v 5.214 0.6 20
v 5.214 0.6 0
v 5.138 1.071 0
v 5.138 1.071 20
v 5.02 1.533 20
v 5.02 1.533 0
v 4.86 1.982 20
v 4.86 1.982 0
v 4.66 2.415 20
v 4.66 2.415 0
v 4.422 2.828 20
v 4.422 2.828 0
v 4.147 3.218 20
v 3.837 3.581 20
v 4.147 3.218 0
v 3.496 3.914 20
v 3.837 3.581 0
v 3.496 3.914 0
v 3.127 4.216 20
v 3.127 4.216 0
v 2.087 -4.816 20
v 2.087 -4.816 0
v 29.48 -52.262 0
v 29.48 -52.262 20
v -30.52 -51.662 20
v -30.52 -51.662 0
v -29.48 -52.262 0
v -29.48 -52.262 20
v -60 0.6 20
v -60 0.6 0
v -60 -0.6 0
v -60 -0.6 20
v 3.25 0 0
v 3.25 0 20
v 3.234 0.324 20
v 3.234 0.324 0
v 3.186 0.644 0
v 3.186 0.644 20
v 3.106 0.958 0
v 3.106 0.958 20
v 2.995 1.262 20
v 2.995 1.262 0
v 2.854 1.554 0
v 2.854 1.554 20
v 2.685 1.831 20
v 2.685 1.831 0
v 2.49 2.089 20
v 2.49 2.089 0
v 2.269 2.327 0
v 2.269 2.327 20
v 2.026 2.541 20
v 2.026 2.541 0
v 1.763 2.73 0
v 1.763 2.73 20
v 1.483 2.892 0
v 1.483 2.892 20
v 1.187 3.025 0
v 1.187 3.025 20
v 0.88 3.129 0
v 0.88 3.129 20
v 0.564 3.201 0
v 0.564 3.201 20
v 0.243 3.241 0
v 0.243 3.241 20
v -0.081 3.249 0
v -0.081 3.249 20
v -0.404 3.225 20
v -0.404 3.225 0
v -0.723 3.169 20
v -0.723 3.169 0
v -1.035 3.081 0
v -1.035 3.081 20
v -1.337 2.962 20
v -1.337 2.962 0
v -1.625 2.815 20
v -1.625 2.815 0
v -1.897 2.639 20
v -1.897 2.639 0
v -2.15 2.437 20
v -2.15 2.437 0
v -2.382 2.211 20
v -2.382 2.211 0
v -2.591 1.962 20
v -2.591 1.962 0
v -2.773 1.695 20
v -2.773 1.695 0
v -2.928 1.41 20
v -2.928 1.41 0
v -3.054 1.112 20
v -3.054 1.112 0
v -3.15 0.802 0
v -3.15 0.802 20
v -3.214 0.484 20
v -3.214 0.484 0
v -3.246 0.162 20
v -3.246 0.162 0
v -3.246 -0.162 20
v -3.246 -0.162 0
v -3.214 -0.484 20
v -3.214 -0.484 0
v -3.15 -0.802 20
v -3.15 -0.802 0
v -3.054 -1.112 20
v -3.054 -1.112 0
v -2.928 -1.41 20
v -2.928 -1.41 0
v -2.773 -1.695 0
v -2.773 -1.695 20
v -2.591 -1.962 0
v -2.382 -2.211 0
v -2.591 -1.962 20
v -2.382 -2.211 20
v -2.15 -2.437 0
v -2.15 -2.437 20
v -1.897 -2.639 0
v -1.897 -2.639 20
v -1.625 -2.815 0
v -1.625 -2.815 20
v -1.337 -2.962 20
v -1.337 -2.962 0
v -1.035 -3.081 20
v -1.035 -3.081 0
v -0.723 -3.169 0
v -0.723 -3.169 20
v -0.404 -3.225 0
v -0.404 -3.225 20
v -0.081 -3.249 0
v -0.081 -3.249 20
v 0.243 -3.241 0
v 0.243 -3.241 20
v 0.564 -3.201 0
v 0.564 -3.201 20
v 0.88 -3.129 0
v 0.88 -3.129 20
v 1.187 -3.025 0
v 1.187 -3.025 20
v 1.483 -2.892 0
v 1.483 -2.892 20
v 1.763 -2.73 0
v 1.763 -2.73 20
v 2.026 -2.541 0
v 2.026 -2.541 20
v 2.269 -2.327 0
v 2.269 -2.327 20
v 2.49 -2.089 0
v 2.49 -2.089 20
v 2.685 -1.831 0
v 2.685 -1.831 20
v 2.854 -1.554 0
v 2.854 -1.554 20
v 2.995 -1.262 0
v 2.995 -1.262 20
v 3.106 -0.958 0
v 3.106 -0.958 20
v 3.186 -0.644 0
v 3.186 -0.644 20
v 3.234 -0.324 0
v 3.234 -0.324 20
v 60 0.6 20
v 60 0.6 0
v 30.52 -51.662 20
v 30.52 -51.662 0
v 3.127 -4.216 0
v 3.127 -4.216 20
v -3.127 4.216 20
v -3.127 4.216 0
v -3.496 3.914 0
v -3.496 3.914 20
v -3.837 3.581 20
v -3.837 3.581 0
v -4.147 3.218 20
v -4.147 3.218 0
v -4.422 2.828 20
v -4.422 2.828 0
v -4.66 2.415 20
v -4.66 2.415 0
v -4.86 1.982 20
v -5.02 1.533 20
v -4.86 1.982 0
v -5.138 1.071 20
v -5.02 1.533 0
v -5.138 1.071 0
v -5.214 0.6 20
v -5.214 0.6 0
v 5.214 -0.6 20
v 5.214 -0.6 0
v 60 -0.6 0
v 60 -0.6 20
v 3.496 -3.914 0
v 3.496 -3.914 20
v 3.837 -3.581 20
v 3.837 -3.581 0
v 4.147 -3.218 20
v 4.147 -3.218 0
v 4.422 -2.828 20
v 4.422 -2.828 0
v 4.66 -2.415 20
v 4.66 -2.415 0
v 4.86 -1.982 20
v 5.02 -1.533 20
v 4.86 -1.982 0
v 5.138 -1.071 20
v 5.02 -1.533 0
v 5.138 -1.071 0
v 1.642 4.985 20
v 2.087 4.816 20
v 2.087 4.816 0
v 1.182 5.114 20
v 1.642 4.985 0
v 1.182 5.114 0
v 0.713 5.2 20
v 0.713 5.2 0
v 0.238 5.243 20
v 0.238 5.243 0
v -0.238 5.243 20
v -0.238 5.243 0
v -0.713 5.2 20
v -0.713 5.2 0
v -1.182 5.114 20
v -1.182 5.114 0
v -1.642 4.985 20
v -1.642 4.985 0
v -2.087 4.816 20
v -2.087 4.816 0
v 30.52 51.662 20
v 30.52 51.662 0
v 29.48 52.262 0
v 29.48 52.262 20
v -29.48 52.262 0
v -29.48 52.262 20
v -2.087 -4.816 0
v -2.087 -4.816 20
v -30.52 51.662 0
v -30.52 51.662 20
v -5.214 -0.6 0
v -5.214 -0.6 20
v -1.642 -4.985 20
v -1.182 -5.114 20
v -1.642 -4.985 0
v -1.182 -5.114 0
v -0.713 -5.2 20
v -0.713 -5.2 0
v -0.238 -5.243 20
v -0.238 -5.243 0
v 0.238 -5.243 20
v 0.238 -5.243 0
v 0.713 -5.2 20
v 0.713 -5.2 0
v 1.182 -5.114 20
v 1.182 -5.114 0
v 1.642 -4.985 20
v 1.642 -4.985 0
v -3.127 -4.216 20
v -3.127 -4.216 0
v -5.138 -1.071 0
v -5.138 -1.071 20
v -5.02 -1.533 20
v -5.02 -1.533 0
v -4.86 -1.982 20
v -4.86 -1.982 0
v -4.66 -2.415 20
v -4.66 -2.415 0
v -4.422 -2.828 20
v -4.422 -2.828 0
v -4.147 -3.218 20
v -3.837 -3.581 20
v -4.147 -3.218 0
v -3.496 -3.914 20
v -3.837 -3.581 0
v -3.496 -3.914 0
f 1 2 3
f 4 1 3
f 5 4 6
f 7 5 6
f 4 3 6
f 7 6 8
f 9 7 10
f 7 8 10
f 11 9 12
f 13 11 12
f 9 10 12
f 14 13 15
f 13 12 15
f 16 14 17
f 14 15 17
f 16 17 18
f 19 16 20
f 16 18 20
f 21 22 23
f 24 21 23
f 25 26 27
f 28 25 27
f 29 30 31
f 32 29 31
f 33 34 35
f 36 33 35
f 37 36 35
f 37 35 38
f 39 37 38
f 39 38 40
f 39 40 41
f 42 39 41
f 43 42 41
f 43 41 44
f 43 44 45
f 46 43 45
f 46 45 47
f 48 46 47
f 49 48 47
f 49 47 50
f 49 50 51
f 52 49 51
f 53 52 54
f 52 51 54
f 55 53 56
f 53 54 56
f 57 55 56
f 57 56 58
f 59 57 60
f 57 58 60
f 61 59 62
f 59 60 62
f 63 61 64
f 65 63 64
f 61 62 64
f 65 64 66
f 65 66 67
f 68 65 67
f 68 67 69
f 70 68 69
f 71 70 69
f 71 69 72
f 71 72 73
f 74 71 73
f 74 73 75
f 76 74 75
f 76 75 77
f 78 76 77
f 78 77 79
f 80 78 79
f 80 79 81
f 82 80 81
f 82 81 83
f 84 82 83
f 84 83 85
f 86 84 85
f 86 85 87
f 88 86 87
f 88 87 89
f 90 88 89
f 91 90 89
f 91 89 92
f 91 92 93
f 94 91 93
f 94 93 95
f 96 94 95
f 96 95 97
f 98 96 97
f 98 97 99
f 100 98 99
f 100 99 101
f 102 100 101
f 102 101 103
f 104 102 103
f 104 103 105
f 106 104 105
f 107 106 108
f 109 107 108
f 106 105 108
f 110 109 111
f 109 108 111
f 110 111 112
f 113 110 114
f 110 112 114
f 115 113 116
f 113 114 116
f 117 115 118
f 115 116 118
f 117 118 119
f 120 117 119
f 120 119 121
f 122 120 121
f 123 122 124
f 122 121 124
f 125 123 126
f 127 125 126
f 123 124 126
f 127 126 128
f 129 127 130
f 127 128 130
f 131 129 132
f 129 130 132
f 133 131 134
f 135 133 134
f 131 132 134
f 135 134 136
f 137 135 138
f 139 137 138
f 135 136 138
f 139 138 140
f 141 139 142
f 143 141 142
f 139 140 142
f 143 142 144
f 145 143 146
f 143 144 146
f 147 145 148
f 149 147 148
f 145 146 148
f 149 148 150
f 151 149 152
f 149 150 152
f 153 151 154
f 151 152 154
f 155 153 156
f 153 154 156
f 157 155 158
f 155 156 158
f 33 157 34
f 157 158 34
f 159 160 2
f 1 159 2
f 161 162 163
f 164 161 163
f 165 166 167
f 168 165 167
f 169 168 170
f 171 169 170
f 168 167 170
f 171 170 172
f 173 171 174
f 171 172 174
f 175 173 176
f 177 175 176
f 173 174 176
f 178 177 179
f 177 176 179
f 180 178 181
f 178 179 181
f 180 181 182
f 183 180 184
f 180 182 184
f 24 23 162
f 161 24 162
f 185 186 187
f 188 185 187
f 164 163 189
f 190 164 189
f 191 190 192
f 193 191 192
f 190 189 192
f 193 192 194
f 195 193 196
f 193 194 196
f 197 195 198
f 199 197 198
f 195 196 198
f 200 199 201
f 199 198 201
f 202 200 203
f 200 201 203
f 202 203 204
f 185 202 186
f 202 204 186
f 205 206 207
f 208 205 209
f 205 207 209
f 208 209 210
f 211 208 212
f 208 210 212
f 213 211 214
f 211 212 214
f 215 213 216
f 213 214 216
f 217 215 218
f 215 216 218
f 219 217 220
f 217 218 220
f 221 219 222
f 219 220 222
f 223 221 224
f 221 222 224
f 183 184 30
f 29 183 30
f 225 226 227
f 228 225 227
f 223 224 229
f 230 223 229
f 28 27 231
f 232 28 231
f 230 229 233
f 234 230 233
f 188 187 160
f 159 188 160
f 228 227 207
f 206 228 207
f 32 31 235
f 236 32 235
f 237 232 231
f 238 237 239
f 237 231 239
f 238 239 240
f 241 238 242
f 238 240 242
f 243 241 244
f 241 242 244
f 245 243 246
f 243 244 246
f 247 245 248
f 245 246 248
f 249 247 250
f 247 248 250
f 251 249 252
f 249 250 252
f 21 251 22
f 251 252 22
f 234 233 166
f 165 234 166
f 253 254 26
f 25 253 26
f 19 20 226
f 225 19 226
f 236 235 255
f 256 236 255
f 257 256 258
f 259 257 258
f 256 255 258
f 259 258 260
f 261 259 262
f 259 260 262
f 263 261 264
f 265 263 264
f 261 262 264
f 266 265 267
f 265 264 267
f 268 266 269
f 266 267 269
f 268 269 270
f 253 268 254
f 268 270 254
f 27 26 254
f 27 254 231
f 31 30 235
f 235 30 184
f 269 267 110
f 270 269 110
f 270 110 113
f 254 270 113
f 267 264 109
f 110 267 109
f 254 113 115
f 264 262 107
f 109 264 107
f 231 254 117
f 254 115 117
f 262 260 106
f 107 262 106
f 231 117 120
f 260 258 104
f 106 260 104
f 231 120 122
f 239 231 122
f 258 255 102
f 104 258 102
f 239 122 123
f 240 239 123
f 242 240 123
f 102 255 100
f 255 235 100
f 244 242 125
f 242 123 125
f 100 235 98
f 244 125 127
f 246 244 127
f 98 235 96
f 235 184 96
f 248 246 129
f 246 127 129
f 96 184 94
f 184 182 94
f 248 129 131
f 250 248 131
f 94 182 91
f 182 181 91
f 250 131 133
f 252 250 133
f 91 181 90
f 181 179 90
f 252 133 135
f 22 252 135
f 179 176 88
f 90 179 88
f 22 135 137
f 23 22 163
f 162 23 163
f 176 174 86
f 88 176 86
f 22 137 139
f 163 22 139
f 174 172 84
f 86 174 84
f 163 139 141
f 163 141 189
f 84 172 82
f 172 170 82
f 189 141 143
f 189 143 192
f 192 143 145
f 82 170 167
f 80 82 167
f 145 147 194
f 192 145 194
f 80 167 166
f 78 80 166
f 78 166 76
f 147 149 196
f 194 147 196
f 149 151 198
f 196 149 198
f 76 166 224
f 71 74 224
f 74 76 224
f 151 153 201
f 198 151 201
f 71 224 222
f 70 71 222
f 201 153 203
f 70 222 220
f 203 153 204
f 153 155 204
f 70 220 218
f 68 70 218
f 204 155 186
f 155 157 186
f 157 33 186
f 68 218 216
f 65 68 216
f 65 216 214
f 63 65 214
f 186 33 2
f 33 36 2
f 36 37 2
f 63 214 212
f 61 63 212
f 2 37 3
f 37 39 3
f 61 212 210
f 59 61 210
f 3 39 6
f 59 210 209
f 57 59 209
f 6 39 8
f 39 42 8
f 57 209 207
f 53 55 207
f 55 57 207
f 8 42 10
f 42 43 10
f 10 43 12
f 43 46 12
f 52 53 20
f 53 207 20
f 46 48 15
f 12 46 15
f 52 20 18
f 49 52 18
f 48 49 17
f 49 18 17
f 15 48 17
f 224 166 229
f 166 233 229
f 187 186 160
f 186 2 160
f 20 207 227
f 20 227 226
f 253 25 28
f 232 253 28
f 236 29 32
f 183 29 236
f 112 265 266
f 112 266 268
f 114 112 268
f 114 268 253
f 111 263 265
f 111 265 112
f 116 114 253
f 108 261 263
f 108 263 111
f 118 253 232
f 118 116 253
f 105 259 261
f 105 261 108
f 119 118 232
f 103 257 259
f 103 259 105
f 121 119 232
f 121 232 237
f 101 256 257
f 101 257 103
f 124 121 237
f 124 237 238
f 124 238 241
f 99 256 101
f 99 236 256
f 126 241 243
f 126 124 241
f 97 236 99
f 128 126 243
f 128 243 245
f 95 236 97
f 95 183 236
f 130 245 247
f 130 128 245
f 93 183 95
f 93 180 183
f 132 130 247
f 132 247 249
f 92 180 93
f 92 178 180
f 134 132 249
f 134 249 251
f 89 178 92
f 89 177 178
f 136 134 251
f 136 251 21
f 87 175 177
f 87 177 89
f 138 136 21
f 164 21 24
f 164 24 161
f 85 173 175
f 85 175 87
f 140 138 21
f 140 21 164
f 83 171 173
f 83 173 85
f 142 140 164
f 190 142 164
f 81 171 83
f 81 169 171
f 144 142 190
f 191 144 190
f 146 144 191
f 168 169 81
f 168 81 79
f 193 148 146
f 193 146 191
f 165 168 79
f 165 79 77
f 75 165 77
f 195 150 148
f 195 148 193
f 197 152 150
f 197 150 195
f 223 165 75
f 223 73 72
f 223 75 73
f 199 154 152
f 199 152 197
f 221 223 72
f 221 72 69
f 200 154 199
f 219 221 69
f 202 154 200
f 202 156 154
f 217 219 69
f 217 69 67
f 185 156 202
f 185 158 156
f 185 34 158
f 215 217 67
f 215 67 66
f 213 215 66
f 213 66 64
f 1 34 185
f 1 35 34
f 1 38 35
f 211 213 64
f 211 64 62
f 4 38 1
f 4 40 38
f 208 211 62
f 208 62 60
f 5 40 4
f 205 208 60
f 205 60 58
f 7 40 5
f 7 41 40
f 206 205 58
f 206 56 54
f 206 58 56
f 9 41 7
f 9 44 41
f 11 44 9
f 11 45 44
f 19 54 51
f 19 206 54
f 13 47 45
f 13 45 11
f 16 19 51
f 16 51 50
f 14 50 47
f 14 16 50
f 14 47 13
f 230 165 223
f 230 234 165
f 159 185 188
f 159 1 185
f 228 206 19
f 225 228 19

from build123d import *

# Parameters (mm, degrees)
F1_DEPTH = 20
F2_R     = 3.25
F3_DEPTH = 20.001


with BuildPart() as f1:
    # F0 (on Top) → F1 (new body)
    with BuildSketch(Plane.XY):
        with BuildLine():
            Line((-5.2141973622, 0.6), (-60, 0.6))
            Line((-60, 0.6), (-60, -0.6))
            Line((-60, -0.6), (-5.2141973622, -0.6))
            ThreePointArc((-5.2141973622, -0.6), (-5.2486049701, 0), (-5.2141973622, 0.6))
        make_face()
        with BuildLine():
            ThreePointArc((-3.1267139234, 4.215627376), (-4.5454252385, 2.624302485), (-5.2141973622, 0.6))
            Line((-5.2141973622, 0.6), (-1.0392304845, 0.6))
            Line((-1.0392304845, 0.6), (-3.1267139234, 4.215627376))
        make_face()
        with BuildLine():
            Line((-1.0392304845, 0.6), (-5.2141973622, 0.6))
            ThreePointArc((-5.2141973622, 0.6), (-5.2486049701, 0), (-5.2141973622, -0.6))
            Line((-5.2141973622, -0.6), (-1.0392304845, -0.6))
            Line((-1.0392304845, -0.6), (-0.692820323, 0))
            Line((-0.692820323, 0), (-1.0392304845, 0.6))
        make_face()
        with BuildLine():
            Line((-3.1267139234, 4.215627376), (-1.0392304845, 0.6))
            Line((-1.0392304845, 0.6), (-0.3464101615, 0.6))
            Line((-0.3464101615, 0.6), (0, 1.2))
            Line((0, 1.2), (-2.0874834388, 4.815627376))
            ThreePointArc((-2.0874834388, 4.815627376), (-2.624302485, 4.5454252385), (-3.1267139234, 4.215627376))
        make_face()
        with BuildLine():
            Line((-30.5196152423, 51.6615242271), (-3.1267139234, 4.215627376))
            ThreePointArc((-3.1267139234, 4.215627376), (-2.624302485, 4.5454252385), (-2.0874834388, 4.815627376))
            Line((-2.0874834388, 4.815627376), (-29.4803847577, 52.2615242271))
            Line((-29.4803847577, 52.2615242271), (-30.5196152423, 51.6615242271))
        make_face()
        with BuildLine():
            Line((-1.0392304845, -0.6), (-5.2141973622, -0.6))
            ThreePointArc((-5.2141973622, -0.6), (-4.5454252385, -2.624302485), (-3.1267139234, -4.215627376))
            Line((-3.1267139234, -4.215627376), (-1.0392304845, -0.6))
        make_face()
        with BuildLine():
            ThreePointArc((2.0874834388, 4.815627376), (0, 5.2486049701), (-2.0874834388, 4.815627376))
            Line((-2.0874834388, 4.815627376), (0, 1.2))
            Line((0, 1.2), (2.0874834388, 4.815627376))
        make_face()
        with BuildLine():
            Line((-0.3464101615, -0.6), (-1.0392304845, -0.6))
            Line((-1.0392304845, -0.6), (-3.1267139234, -4.215627376))
            ThreePointArc((-3.1267139234, -4.215627376), (-2.624302485, -4.5454252385), (-2.0874834388, -4.815627376))
            Line((-2.0874834388, -4.815627376), (0, -1.2))
            Line((0, -1.2), (-0.3464101615, -0.6))
        make_face()
        with BuildLine():
            ThreePointArc((-2.0874834388, -4.815627376), (-2.624302485, -4.5454252385), (-3.1267139234, -4.215627376))
            Line((-3.1267139234, -4.215627376), (-30.5196152423, -51.6615242271))
            Line((-30.5196152423, -51.6615242271), (-29.4803847577, -52.2615242271))
            Line((-29.4803847577, -52.2615242271), (-2.0874834388, -4.815627376))
        make_face()
        with BuildLine():
            Line((2.0874834388, 4.815627376), (0, 1.2))
            Line((0, 1.2), (0.3464101615, 0.6))
            Line((0.3464101615, 0.6), (1.0392304845, 0.6))
            Line((1.0392304845, 0.6), (3.1267139234, 4.215627376))
            ThreePointArc((3.1267139234, 4.215627376), (2.624302485, 4.5454252385), (2.0874834388, 4.815627376))
        make_face()
        with BuildLine():
            Line((29.4803847577, 52.2615242271), (2.0874834388, 4.815627376))
            ThreePointArc((2.0874834388, 4.815627376), (2.624302485, 4.5454252385), (3.1267139234, 4.215627376))
            Line((3.1267139234, 4.215627376), (30.5196152423, 51.6615242271))
            Line((30.5196152423, 51.6615242271), (29.4803847577, 52.2615242271))
        make_face()
        with BuildLine():
            Line((0, -1.2), (-2.0874834388, -4.815627376))
            ThreePointArc((-2.0874834388, -4.815627376), (0, -5.2486049701), (2.0874834388, -4.815627376))
            Line((2.0874834388, -4.815627376), (0, -1.2))
        make_face()
        with BuildLine():
            ThreePointArc((5.2141973622, 0.6), (4.5454252385, 2.624302485), (3.1267139234, 4.215627376))
            Line((3.1267139234, 4.215627376), (1.0392304845, 0.6))
            Line((1.0392304845, 0.6), (5.2141973622, 0.6))
        make_face()
        with BuildLine():
            Line((0.3464101615, -0.6), (0, -1.2))
            Line((0, -1.2), (2.0874834388, -4.815627376))
            ThreePointArc((2.0874834388, -4.815627376), (2.624302485, -4.5454252385), (3.1267139234, -4.215627376))
            Line((3.1267139234, -4.215627376), (1.0392304845, -0.6))
            Line((1.0392304845, -0.6), (0.3464101615, -0.6))
        make_face()
        with BuildLine():
            ThreePointArc((3.1267139234, -4.215627376), (2.624302485, -4.5454252385), (2.0874834388, -4.815627376))
            Line((2.0874834388, -4.815627376), (29.4803847577, -52.2615242271))
            Line((29.4803847577, -52.2615242271), (30.5196152423, -51.6615242271))
            Line((30.5196152423, -51.6615242271), (3.1267139234, -4.215627376))
        make_face()
        with BuildLine():
            Line((5.2141973622, 0.6), (1.0392304845, 0.6))
            Line((1.0392304845, 0.6), (0.692820323, 0))
            Line((0.692820323, 0), (1.0392304845, -0.6))
            Line((1.0392304845, -0.6), (5.2141973622, -0.6))
            ThreePointArc((5.2141973622, -0.6), (5.2399960077, -0.3004928799), (5.2486049701, 0))
            ThreePointArc((5.2486049701, 0), (5.2399960077, 0.3004928799), (5.2141973622, 0.6))
        make_face()
        with BuildLine():
            Line((60, 0.6), (5.2141973622, 0.6))
            ThreePointArc((5.2141973622, 0.6), (5.2399960077, 0.3004928799), (5.2486049701, 0))
            ThreePointArc((5.2486049701, 0), (5.2399960077, -0.3004928799), (5.2141973622, -0.6))
            Line((5.2141973622, -0.6), (60, -0.6))
            Line((60, -0.6), (60, 0.6))
        make_face()
        with BuildLine():
            Line((1.0392304845, -0.6), (3.1267139234, -4.215627376))
            ThreePointArc((3.1267139234, -4.215627376), (4.5454252385, -2.624302485), (5.2141973622, -0.6))
            Line((5.2141973622, -0.6), (1.0392304845, -0.6))
        make_face()
    extrude(amount=F1_DEPTH)

    # F2 (on face) → F3 (cut, through all)
    with BuildSketch(Plane.XY.offset(20)):
        Circle(F2_R)
        Polygon((1.0392304845, 0.6), (0.692820323, 0), (1.0392304845, -0.6), (0.3464101615, -0.6), (0, -1.2), (-0.3464101615, -0.6), (-1.0392304845, -0.6), (-0.692820323, 0), (-1.0392304845, 0.6), (-0.3464101615, 0.6), (0, 1.2), (0.3464101615, 0.6), align=None, mode=Mode.SUBTRACT)
    extrude(amount=-F3_DEPTH, mode=Mode.SUBTRACT)


solid = f1.part
